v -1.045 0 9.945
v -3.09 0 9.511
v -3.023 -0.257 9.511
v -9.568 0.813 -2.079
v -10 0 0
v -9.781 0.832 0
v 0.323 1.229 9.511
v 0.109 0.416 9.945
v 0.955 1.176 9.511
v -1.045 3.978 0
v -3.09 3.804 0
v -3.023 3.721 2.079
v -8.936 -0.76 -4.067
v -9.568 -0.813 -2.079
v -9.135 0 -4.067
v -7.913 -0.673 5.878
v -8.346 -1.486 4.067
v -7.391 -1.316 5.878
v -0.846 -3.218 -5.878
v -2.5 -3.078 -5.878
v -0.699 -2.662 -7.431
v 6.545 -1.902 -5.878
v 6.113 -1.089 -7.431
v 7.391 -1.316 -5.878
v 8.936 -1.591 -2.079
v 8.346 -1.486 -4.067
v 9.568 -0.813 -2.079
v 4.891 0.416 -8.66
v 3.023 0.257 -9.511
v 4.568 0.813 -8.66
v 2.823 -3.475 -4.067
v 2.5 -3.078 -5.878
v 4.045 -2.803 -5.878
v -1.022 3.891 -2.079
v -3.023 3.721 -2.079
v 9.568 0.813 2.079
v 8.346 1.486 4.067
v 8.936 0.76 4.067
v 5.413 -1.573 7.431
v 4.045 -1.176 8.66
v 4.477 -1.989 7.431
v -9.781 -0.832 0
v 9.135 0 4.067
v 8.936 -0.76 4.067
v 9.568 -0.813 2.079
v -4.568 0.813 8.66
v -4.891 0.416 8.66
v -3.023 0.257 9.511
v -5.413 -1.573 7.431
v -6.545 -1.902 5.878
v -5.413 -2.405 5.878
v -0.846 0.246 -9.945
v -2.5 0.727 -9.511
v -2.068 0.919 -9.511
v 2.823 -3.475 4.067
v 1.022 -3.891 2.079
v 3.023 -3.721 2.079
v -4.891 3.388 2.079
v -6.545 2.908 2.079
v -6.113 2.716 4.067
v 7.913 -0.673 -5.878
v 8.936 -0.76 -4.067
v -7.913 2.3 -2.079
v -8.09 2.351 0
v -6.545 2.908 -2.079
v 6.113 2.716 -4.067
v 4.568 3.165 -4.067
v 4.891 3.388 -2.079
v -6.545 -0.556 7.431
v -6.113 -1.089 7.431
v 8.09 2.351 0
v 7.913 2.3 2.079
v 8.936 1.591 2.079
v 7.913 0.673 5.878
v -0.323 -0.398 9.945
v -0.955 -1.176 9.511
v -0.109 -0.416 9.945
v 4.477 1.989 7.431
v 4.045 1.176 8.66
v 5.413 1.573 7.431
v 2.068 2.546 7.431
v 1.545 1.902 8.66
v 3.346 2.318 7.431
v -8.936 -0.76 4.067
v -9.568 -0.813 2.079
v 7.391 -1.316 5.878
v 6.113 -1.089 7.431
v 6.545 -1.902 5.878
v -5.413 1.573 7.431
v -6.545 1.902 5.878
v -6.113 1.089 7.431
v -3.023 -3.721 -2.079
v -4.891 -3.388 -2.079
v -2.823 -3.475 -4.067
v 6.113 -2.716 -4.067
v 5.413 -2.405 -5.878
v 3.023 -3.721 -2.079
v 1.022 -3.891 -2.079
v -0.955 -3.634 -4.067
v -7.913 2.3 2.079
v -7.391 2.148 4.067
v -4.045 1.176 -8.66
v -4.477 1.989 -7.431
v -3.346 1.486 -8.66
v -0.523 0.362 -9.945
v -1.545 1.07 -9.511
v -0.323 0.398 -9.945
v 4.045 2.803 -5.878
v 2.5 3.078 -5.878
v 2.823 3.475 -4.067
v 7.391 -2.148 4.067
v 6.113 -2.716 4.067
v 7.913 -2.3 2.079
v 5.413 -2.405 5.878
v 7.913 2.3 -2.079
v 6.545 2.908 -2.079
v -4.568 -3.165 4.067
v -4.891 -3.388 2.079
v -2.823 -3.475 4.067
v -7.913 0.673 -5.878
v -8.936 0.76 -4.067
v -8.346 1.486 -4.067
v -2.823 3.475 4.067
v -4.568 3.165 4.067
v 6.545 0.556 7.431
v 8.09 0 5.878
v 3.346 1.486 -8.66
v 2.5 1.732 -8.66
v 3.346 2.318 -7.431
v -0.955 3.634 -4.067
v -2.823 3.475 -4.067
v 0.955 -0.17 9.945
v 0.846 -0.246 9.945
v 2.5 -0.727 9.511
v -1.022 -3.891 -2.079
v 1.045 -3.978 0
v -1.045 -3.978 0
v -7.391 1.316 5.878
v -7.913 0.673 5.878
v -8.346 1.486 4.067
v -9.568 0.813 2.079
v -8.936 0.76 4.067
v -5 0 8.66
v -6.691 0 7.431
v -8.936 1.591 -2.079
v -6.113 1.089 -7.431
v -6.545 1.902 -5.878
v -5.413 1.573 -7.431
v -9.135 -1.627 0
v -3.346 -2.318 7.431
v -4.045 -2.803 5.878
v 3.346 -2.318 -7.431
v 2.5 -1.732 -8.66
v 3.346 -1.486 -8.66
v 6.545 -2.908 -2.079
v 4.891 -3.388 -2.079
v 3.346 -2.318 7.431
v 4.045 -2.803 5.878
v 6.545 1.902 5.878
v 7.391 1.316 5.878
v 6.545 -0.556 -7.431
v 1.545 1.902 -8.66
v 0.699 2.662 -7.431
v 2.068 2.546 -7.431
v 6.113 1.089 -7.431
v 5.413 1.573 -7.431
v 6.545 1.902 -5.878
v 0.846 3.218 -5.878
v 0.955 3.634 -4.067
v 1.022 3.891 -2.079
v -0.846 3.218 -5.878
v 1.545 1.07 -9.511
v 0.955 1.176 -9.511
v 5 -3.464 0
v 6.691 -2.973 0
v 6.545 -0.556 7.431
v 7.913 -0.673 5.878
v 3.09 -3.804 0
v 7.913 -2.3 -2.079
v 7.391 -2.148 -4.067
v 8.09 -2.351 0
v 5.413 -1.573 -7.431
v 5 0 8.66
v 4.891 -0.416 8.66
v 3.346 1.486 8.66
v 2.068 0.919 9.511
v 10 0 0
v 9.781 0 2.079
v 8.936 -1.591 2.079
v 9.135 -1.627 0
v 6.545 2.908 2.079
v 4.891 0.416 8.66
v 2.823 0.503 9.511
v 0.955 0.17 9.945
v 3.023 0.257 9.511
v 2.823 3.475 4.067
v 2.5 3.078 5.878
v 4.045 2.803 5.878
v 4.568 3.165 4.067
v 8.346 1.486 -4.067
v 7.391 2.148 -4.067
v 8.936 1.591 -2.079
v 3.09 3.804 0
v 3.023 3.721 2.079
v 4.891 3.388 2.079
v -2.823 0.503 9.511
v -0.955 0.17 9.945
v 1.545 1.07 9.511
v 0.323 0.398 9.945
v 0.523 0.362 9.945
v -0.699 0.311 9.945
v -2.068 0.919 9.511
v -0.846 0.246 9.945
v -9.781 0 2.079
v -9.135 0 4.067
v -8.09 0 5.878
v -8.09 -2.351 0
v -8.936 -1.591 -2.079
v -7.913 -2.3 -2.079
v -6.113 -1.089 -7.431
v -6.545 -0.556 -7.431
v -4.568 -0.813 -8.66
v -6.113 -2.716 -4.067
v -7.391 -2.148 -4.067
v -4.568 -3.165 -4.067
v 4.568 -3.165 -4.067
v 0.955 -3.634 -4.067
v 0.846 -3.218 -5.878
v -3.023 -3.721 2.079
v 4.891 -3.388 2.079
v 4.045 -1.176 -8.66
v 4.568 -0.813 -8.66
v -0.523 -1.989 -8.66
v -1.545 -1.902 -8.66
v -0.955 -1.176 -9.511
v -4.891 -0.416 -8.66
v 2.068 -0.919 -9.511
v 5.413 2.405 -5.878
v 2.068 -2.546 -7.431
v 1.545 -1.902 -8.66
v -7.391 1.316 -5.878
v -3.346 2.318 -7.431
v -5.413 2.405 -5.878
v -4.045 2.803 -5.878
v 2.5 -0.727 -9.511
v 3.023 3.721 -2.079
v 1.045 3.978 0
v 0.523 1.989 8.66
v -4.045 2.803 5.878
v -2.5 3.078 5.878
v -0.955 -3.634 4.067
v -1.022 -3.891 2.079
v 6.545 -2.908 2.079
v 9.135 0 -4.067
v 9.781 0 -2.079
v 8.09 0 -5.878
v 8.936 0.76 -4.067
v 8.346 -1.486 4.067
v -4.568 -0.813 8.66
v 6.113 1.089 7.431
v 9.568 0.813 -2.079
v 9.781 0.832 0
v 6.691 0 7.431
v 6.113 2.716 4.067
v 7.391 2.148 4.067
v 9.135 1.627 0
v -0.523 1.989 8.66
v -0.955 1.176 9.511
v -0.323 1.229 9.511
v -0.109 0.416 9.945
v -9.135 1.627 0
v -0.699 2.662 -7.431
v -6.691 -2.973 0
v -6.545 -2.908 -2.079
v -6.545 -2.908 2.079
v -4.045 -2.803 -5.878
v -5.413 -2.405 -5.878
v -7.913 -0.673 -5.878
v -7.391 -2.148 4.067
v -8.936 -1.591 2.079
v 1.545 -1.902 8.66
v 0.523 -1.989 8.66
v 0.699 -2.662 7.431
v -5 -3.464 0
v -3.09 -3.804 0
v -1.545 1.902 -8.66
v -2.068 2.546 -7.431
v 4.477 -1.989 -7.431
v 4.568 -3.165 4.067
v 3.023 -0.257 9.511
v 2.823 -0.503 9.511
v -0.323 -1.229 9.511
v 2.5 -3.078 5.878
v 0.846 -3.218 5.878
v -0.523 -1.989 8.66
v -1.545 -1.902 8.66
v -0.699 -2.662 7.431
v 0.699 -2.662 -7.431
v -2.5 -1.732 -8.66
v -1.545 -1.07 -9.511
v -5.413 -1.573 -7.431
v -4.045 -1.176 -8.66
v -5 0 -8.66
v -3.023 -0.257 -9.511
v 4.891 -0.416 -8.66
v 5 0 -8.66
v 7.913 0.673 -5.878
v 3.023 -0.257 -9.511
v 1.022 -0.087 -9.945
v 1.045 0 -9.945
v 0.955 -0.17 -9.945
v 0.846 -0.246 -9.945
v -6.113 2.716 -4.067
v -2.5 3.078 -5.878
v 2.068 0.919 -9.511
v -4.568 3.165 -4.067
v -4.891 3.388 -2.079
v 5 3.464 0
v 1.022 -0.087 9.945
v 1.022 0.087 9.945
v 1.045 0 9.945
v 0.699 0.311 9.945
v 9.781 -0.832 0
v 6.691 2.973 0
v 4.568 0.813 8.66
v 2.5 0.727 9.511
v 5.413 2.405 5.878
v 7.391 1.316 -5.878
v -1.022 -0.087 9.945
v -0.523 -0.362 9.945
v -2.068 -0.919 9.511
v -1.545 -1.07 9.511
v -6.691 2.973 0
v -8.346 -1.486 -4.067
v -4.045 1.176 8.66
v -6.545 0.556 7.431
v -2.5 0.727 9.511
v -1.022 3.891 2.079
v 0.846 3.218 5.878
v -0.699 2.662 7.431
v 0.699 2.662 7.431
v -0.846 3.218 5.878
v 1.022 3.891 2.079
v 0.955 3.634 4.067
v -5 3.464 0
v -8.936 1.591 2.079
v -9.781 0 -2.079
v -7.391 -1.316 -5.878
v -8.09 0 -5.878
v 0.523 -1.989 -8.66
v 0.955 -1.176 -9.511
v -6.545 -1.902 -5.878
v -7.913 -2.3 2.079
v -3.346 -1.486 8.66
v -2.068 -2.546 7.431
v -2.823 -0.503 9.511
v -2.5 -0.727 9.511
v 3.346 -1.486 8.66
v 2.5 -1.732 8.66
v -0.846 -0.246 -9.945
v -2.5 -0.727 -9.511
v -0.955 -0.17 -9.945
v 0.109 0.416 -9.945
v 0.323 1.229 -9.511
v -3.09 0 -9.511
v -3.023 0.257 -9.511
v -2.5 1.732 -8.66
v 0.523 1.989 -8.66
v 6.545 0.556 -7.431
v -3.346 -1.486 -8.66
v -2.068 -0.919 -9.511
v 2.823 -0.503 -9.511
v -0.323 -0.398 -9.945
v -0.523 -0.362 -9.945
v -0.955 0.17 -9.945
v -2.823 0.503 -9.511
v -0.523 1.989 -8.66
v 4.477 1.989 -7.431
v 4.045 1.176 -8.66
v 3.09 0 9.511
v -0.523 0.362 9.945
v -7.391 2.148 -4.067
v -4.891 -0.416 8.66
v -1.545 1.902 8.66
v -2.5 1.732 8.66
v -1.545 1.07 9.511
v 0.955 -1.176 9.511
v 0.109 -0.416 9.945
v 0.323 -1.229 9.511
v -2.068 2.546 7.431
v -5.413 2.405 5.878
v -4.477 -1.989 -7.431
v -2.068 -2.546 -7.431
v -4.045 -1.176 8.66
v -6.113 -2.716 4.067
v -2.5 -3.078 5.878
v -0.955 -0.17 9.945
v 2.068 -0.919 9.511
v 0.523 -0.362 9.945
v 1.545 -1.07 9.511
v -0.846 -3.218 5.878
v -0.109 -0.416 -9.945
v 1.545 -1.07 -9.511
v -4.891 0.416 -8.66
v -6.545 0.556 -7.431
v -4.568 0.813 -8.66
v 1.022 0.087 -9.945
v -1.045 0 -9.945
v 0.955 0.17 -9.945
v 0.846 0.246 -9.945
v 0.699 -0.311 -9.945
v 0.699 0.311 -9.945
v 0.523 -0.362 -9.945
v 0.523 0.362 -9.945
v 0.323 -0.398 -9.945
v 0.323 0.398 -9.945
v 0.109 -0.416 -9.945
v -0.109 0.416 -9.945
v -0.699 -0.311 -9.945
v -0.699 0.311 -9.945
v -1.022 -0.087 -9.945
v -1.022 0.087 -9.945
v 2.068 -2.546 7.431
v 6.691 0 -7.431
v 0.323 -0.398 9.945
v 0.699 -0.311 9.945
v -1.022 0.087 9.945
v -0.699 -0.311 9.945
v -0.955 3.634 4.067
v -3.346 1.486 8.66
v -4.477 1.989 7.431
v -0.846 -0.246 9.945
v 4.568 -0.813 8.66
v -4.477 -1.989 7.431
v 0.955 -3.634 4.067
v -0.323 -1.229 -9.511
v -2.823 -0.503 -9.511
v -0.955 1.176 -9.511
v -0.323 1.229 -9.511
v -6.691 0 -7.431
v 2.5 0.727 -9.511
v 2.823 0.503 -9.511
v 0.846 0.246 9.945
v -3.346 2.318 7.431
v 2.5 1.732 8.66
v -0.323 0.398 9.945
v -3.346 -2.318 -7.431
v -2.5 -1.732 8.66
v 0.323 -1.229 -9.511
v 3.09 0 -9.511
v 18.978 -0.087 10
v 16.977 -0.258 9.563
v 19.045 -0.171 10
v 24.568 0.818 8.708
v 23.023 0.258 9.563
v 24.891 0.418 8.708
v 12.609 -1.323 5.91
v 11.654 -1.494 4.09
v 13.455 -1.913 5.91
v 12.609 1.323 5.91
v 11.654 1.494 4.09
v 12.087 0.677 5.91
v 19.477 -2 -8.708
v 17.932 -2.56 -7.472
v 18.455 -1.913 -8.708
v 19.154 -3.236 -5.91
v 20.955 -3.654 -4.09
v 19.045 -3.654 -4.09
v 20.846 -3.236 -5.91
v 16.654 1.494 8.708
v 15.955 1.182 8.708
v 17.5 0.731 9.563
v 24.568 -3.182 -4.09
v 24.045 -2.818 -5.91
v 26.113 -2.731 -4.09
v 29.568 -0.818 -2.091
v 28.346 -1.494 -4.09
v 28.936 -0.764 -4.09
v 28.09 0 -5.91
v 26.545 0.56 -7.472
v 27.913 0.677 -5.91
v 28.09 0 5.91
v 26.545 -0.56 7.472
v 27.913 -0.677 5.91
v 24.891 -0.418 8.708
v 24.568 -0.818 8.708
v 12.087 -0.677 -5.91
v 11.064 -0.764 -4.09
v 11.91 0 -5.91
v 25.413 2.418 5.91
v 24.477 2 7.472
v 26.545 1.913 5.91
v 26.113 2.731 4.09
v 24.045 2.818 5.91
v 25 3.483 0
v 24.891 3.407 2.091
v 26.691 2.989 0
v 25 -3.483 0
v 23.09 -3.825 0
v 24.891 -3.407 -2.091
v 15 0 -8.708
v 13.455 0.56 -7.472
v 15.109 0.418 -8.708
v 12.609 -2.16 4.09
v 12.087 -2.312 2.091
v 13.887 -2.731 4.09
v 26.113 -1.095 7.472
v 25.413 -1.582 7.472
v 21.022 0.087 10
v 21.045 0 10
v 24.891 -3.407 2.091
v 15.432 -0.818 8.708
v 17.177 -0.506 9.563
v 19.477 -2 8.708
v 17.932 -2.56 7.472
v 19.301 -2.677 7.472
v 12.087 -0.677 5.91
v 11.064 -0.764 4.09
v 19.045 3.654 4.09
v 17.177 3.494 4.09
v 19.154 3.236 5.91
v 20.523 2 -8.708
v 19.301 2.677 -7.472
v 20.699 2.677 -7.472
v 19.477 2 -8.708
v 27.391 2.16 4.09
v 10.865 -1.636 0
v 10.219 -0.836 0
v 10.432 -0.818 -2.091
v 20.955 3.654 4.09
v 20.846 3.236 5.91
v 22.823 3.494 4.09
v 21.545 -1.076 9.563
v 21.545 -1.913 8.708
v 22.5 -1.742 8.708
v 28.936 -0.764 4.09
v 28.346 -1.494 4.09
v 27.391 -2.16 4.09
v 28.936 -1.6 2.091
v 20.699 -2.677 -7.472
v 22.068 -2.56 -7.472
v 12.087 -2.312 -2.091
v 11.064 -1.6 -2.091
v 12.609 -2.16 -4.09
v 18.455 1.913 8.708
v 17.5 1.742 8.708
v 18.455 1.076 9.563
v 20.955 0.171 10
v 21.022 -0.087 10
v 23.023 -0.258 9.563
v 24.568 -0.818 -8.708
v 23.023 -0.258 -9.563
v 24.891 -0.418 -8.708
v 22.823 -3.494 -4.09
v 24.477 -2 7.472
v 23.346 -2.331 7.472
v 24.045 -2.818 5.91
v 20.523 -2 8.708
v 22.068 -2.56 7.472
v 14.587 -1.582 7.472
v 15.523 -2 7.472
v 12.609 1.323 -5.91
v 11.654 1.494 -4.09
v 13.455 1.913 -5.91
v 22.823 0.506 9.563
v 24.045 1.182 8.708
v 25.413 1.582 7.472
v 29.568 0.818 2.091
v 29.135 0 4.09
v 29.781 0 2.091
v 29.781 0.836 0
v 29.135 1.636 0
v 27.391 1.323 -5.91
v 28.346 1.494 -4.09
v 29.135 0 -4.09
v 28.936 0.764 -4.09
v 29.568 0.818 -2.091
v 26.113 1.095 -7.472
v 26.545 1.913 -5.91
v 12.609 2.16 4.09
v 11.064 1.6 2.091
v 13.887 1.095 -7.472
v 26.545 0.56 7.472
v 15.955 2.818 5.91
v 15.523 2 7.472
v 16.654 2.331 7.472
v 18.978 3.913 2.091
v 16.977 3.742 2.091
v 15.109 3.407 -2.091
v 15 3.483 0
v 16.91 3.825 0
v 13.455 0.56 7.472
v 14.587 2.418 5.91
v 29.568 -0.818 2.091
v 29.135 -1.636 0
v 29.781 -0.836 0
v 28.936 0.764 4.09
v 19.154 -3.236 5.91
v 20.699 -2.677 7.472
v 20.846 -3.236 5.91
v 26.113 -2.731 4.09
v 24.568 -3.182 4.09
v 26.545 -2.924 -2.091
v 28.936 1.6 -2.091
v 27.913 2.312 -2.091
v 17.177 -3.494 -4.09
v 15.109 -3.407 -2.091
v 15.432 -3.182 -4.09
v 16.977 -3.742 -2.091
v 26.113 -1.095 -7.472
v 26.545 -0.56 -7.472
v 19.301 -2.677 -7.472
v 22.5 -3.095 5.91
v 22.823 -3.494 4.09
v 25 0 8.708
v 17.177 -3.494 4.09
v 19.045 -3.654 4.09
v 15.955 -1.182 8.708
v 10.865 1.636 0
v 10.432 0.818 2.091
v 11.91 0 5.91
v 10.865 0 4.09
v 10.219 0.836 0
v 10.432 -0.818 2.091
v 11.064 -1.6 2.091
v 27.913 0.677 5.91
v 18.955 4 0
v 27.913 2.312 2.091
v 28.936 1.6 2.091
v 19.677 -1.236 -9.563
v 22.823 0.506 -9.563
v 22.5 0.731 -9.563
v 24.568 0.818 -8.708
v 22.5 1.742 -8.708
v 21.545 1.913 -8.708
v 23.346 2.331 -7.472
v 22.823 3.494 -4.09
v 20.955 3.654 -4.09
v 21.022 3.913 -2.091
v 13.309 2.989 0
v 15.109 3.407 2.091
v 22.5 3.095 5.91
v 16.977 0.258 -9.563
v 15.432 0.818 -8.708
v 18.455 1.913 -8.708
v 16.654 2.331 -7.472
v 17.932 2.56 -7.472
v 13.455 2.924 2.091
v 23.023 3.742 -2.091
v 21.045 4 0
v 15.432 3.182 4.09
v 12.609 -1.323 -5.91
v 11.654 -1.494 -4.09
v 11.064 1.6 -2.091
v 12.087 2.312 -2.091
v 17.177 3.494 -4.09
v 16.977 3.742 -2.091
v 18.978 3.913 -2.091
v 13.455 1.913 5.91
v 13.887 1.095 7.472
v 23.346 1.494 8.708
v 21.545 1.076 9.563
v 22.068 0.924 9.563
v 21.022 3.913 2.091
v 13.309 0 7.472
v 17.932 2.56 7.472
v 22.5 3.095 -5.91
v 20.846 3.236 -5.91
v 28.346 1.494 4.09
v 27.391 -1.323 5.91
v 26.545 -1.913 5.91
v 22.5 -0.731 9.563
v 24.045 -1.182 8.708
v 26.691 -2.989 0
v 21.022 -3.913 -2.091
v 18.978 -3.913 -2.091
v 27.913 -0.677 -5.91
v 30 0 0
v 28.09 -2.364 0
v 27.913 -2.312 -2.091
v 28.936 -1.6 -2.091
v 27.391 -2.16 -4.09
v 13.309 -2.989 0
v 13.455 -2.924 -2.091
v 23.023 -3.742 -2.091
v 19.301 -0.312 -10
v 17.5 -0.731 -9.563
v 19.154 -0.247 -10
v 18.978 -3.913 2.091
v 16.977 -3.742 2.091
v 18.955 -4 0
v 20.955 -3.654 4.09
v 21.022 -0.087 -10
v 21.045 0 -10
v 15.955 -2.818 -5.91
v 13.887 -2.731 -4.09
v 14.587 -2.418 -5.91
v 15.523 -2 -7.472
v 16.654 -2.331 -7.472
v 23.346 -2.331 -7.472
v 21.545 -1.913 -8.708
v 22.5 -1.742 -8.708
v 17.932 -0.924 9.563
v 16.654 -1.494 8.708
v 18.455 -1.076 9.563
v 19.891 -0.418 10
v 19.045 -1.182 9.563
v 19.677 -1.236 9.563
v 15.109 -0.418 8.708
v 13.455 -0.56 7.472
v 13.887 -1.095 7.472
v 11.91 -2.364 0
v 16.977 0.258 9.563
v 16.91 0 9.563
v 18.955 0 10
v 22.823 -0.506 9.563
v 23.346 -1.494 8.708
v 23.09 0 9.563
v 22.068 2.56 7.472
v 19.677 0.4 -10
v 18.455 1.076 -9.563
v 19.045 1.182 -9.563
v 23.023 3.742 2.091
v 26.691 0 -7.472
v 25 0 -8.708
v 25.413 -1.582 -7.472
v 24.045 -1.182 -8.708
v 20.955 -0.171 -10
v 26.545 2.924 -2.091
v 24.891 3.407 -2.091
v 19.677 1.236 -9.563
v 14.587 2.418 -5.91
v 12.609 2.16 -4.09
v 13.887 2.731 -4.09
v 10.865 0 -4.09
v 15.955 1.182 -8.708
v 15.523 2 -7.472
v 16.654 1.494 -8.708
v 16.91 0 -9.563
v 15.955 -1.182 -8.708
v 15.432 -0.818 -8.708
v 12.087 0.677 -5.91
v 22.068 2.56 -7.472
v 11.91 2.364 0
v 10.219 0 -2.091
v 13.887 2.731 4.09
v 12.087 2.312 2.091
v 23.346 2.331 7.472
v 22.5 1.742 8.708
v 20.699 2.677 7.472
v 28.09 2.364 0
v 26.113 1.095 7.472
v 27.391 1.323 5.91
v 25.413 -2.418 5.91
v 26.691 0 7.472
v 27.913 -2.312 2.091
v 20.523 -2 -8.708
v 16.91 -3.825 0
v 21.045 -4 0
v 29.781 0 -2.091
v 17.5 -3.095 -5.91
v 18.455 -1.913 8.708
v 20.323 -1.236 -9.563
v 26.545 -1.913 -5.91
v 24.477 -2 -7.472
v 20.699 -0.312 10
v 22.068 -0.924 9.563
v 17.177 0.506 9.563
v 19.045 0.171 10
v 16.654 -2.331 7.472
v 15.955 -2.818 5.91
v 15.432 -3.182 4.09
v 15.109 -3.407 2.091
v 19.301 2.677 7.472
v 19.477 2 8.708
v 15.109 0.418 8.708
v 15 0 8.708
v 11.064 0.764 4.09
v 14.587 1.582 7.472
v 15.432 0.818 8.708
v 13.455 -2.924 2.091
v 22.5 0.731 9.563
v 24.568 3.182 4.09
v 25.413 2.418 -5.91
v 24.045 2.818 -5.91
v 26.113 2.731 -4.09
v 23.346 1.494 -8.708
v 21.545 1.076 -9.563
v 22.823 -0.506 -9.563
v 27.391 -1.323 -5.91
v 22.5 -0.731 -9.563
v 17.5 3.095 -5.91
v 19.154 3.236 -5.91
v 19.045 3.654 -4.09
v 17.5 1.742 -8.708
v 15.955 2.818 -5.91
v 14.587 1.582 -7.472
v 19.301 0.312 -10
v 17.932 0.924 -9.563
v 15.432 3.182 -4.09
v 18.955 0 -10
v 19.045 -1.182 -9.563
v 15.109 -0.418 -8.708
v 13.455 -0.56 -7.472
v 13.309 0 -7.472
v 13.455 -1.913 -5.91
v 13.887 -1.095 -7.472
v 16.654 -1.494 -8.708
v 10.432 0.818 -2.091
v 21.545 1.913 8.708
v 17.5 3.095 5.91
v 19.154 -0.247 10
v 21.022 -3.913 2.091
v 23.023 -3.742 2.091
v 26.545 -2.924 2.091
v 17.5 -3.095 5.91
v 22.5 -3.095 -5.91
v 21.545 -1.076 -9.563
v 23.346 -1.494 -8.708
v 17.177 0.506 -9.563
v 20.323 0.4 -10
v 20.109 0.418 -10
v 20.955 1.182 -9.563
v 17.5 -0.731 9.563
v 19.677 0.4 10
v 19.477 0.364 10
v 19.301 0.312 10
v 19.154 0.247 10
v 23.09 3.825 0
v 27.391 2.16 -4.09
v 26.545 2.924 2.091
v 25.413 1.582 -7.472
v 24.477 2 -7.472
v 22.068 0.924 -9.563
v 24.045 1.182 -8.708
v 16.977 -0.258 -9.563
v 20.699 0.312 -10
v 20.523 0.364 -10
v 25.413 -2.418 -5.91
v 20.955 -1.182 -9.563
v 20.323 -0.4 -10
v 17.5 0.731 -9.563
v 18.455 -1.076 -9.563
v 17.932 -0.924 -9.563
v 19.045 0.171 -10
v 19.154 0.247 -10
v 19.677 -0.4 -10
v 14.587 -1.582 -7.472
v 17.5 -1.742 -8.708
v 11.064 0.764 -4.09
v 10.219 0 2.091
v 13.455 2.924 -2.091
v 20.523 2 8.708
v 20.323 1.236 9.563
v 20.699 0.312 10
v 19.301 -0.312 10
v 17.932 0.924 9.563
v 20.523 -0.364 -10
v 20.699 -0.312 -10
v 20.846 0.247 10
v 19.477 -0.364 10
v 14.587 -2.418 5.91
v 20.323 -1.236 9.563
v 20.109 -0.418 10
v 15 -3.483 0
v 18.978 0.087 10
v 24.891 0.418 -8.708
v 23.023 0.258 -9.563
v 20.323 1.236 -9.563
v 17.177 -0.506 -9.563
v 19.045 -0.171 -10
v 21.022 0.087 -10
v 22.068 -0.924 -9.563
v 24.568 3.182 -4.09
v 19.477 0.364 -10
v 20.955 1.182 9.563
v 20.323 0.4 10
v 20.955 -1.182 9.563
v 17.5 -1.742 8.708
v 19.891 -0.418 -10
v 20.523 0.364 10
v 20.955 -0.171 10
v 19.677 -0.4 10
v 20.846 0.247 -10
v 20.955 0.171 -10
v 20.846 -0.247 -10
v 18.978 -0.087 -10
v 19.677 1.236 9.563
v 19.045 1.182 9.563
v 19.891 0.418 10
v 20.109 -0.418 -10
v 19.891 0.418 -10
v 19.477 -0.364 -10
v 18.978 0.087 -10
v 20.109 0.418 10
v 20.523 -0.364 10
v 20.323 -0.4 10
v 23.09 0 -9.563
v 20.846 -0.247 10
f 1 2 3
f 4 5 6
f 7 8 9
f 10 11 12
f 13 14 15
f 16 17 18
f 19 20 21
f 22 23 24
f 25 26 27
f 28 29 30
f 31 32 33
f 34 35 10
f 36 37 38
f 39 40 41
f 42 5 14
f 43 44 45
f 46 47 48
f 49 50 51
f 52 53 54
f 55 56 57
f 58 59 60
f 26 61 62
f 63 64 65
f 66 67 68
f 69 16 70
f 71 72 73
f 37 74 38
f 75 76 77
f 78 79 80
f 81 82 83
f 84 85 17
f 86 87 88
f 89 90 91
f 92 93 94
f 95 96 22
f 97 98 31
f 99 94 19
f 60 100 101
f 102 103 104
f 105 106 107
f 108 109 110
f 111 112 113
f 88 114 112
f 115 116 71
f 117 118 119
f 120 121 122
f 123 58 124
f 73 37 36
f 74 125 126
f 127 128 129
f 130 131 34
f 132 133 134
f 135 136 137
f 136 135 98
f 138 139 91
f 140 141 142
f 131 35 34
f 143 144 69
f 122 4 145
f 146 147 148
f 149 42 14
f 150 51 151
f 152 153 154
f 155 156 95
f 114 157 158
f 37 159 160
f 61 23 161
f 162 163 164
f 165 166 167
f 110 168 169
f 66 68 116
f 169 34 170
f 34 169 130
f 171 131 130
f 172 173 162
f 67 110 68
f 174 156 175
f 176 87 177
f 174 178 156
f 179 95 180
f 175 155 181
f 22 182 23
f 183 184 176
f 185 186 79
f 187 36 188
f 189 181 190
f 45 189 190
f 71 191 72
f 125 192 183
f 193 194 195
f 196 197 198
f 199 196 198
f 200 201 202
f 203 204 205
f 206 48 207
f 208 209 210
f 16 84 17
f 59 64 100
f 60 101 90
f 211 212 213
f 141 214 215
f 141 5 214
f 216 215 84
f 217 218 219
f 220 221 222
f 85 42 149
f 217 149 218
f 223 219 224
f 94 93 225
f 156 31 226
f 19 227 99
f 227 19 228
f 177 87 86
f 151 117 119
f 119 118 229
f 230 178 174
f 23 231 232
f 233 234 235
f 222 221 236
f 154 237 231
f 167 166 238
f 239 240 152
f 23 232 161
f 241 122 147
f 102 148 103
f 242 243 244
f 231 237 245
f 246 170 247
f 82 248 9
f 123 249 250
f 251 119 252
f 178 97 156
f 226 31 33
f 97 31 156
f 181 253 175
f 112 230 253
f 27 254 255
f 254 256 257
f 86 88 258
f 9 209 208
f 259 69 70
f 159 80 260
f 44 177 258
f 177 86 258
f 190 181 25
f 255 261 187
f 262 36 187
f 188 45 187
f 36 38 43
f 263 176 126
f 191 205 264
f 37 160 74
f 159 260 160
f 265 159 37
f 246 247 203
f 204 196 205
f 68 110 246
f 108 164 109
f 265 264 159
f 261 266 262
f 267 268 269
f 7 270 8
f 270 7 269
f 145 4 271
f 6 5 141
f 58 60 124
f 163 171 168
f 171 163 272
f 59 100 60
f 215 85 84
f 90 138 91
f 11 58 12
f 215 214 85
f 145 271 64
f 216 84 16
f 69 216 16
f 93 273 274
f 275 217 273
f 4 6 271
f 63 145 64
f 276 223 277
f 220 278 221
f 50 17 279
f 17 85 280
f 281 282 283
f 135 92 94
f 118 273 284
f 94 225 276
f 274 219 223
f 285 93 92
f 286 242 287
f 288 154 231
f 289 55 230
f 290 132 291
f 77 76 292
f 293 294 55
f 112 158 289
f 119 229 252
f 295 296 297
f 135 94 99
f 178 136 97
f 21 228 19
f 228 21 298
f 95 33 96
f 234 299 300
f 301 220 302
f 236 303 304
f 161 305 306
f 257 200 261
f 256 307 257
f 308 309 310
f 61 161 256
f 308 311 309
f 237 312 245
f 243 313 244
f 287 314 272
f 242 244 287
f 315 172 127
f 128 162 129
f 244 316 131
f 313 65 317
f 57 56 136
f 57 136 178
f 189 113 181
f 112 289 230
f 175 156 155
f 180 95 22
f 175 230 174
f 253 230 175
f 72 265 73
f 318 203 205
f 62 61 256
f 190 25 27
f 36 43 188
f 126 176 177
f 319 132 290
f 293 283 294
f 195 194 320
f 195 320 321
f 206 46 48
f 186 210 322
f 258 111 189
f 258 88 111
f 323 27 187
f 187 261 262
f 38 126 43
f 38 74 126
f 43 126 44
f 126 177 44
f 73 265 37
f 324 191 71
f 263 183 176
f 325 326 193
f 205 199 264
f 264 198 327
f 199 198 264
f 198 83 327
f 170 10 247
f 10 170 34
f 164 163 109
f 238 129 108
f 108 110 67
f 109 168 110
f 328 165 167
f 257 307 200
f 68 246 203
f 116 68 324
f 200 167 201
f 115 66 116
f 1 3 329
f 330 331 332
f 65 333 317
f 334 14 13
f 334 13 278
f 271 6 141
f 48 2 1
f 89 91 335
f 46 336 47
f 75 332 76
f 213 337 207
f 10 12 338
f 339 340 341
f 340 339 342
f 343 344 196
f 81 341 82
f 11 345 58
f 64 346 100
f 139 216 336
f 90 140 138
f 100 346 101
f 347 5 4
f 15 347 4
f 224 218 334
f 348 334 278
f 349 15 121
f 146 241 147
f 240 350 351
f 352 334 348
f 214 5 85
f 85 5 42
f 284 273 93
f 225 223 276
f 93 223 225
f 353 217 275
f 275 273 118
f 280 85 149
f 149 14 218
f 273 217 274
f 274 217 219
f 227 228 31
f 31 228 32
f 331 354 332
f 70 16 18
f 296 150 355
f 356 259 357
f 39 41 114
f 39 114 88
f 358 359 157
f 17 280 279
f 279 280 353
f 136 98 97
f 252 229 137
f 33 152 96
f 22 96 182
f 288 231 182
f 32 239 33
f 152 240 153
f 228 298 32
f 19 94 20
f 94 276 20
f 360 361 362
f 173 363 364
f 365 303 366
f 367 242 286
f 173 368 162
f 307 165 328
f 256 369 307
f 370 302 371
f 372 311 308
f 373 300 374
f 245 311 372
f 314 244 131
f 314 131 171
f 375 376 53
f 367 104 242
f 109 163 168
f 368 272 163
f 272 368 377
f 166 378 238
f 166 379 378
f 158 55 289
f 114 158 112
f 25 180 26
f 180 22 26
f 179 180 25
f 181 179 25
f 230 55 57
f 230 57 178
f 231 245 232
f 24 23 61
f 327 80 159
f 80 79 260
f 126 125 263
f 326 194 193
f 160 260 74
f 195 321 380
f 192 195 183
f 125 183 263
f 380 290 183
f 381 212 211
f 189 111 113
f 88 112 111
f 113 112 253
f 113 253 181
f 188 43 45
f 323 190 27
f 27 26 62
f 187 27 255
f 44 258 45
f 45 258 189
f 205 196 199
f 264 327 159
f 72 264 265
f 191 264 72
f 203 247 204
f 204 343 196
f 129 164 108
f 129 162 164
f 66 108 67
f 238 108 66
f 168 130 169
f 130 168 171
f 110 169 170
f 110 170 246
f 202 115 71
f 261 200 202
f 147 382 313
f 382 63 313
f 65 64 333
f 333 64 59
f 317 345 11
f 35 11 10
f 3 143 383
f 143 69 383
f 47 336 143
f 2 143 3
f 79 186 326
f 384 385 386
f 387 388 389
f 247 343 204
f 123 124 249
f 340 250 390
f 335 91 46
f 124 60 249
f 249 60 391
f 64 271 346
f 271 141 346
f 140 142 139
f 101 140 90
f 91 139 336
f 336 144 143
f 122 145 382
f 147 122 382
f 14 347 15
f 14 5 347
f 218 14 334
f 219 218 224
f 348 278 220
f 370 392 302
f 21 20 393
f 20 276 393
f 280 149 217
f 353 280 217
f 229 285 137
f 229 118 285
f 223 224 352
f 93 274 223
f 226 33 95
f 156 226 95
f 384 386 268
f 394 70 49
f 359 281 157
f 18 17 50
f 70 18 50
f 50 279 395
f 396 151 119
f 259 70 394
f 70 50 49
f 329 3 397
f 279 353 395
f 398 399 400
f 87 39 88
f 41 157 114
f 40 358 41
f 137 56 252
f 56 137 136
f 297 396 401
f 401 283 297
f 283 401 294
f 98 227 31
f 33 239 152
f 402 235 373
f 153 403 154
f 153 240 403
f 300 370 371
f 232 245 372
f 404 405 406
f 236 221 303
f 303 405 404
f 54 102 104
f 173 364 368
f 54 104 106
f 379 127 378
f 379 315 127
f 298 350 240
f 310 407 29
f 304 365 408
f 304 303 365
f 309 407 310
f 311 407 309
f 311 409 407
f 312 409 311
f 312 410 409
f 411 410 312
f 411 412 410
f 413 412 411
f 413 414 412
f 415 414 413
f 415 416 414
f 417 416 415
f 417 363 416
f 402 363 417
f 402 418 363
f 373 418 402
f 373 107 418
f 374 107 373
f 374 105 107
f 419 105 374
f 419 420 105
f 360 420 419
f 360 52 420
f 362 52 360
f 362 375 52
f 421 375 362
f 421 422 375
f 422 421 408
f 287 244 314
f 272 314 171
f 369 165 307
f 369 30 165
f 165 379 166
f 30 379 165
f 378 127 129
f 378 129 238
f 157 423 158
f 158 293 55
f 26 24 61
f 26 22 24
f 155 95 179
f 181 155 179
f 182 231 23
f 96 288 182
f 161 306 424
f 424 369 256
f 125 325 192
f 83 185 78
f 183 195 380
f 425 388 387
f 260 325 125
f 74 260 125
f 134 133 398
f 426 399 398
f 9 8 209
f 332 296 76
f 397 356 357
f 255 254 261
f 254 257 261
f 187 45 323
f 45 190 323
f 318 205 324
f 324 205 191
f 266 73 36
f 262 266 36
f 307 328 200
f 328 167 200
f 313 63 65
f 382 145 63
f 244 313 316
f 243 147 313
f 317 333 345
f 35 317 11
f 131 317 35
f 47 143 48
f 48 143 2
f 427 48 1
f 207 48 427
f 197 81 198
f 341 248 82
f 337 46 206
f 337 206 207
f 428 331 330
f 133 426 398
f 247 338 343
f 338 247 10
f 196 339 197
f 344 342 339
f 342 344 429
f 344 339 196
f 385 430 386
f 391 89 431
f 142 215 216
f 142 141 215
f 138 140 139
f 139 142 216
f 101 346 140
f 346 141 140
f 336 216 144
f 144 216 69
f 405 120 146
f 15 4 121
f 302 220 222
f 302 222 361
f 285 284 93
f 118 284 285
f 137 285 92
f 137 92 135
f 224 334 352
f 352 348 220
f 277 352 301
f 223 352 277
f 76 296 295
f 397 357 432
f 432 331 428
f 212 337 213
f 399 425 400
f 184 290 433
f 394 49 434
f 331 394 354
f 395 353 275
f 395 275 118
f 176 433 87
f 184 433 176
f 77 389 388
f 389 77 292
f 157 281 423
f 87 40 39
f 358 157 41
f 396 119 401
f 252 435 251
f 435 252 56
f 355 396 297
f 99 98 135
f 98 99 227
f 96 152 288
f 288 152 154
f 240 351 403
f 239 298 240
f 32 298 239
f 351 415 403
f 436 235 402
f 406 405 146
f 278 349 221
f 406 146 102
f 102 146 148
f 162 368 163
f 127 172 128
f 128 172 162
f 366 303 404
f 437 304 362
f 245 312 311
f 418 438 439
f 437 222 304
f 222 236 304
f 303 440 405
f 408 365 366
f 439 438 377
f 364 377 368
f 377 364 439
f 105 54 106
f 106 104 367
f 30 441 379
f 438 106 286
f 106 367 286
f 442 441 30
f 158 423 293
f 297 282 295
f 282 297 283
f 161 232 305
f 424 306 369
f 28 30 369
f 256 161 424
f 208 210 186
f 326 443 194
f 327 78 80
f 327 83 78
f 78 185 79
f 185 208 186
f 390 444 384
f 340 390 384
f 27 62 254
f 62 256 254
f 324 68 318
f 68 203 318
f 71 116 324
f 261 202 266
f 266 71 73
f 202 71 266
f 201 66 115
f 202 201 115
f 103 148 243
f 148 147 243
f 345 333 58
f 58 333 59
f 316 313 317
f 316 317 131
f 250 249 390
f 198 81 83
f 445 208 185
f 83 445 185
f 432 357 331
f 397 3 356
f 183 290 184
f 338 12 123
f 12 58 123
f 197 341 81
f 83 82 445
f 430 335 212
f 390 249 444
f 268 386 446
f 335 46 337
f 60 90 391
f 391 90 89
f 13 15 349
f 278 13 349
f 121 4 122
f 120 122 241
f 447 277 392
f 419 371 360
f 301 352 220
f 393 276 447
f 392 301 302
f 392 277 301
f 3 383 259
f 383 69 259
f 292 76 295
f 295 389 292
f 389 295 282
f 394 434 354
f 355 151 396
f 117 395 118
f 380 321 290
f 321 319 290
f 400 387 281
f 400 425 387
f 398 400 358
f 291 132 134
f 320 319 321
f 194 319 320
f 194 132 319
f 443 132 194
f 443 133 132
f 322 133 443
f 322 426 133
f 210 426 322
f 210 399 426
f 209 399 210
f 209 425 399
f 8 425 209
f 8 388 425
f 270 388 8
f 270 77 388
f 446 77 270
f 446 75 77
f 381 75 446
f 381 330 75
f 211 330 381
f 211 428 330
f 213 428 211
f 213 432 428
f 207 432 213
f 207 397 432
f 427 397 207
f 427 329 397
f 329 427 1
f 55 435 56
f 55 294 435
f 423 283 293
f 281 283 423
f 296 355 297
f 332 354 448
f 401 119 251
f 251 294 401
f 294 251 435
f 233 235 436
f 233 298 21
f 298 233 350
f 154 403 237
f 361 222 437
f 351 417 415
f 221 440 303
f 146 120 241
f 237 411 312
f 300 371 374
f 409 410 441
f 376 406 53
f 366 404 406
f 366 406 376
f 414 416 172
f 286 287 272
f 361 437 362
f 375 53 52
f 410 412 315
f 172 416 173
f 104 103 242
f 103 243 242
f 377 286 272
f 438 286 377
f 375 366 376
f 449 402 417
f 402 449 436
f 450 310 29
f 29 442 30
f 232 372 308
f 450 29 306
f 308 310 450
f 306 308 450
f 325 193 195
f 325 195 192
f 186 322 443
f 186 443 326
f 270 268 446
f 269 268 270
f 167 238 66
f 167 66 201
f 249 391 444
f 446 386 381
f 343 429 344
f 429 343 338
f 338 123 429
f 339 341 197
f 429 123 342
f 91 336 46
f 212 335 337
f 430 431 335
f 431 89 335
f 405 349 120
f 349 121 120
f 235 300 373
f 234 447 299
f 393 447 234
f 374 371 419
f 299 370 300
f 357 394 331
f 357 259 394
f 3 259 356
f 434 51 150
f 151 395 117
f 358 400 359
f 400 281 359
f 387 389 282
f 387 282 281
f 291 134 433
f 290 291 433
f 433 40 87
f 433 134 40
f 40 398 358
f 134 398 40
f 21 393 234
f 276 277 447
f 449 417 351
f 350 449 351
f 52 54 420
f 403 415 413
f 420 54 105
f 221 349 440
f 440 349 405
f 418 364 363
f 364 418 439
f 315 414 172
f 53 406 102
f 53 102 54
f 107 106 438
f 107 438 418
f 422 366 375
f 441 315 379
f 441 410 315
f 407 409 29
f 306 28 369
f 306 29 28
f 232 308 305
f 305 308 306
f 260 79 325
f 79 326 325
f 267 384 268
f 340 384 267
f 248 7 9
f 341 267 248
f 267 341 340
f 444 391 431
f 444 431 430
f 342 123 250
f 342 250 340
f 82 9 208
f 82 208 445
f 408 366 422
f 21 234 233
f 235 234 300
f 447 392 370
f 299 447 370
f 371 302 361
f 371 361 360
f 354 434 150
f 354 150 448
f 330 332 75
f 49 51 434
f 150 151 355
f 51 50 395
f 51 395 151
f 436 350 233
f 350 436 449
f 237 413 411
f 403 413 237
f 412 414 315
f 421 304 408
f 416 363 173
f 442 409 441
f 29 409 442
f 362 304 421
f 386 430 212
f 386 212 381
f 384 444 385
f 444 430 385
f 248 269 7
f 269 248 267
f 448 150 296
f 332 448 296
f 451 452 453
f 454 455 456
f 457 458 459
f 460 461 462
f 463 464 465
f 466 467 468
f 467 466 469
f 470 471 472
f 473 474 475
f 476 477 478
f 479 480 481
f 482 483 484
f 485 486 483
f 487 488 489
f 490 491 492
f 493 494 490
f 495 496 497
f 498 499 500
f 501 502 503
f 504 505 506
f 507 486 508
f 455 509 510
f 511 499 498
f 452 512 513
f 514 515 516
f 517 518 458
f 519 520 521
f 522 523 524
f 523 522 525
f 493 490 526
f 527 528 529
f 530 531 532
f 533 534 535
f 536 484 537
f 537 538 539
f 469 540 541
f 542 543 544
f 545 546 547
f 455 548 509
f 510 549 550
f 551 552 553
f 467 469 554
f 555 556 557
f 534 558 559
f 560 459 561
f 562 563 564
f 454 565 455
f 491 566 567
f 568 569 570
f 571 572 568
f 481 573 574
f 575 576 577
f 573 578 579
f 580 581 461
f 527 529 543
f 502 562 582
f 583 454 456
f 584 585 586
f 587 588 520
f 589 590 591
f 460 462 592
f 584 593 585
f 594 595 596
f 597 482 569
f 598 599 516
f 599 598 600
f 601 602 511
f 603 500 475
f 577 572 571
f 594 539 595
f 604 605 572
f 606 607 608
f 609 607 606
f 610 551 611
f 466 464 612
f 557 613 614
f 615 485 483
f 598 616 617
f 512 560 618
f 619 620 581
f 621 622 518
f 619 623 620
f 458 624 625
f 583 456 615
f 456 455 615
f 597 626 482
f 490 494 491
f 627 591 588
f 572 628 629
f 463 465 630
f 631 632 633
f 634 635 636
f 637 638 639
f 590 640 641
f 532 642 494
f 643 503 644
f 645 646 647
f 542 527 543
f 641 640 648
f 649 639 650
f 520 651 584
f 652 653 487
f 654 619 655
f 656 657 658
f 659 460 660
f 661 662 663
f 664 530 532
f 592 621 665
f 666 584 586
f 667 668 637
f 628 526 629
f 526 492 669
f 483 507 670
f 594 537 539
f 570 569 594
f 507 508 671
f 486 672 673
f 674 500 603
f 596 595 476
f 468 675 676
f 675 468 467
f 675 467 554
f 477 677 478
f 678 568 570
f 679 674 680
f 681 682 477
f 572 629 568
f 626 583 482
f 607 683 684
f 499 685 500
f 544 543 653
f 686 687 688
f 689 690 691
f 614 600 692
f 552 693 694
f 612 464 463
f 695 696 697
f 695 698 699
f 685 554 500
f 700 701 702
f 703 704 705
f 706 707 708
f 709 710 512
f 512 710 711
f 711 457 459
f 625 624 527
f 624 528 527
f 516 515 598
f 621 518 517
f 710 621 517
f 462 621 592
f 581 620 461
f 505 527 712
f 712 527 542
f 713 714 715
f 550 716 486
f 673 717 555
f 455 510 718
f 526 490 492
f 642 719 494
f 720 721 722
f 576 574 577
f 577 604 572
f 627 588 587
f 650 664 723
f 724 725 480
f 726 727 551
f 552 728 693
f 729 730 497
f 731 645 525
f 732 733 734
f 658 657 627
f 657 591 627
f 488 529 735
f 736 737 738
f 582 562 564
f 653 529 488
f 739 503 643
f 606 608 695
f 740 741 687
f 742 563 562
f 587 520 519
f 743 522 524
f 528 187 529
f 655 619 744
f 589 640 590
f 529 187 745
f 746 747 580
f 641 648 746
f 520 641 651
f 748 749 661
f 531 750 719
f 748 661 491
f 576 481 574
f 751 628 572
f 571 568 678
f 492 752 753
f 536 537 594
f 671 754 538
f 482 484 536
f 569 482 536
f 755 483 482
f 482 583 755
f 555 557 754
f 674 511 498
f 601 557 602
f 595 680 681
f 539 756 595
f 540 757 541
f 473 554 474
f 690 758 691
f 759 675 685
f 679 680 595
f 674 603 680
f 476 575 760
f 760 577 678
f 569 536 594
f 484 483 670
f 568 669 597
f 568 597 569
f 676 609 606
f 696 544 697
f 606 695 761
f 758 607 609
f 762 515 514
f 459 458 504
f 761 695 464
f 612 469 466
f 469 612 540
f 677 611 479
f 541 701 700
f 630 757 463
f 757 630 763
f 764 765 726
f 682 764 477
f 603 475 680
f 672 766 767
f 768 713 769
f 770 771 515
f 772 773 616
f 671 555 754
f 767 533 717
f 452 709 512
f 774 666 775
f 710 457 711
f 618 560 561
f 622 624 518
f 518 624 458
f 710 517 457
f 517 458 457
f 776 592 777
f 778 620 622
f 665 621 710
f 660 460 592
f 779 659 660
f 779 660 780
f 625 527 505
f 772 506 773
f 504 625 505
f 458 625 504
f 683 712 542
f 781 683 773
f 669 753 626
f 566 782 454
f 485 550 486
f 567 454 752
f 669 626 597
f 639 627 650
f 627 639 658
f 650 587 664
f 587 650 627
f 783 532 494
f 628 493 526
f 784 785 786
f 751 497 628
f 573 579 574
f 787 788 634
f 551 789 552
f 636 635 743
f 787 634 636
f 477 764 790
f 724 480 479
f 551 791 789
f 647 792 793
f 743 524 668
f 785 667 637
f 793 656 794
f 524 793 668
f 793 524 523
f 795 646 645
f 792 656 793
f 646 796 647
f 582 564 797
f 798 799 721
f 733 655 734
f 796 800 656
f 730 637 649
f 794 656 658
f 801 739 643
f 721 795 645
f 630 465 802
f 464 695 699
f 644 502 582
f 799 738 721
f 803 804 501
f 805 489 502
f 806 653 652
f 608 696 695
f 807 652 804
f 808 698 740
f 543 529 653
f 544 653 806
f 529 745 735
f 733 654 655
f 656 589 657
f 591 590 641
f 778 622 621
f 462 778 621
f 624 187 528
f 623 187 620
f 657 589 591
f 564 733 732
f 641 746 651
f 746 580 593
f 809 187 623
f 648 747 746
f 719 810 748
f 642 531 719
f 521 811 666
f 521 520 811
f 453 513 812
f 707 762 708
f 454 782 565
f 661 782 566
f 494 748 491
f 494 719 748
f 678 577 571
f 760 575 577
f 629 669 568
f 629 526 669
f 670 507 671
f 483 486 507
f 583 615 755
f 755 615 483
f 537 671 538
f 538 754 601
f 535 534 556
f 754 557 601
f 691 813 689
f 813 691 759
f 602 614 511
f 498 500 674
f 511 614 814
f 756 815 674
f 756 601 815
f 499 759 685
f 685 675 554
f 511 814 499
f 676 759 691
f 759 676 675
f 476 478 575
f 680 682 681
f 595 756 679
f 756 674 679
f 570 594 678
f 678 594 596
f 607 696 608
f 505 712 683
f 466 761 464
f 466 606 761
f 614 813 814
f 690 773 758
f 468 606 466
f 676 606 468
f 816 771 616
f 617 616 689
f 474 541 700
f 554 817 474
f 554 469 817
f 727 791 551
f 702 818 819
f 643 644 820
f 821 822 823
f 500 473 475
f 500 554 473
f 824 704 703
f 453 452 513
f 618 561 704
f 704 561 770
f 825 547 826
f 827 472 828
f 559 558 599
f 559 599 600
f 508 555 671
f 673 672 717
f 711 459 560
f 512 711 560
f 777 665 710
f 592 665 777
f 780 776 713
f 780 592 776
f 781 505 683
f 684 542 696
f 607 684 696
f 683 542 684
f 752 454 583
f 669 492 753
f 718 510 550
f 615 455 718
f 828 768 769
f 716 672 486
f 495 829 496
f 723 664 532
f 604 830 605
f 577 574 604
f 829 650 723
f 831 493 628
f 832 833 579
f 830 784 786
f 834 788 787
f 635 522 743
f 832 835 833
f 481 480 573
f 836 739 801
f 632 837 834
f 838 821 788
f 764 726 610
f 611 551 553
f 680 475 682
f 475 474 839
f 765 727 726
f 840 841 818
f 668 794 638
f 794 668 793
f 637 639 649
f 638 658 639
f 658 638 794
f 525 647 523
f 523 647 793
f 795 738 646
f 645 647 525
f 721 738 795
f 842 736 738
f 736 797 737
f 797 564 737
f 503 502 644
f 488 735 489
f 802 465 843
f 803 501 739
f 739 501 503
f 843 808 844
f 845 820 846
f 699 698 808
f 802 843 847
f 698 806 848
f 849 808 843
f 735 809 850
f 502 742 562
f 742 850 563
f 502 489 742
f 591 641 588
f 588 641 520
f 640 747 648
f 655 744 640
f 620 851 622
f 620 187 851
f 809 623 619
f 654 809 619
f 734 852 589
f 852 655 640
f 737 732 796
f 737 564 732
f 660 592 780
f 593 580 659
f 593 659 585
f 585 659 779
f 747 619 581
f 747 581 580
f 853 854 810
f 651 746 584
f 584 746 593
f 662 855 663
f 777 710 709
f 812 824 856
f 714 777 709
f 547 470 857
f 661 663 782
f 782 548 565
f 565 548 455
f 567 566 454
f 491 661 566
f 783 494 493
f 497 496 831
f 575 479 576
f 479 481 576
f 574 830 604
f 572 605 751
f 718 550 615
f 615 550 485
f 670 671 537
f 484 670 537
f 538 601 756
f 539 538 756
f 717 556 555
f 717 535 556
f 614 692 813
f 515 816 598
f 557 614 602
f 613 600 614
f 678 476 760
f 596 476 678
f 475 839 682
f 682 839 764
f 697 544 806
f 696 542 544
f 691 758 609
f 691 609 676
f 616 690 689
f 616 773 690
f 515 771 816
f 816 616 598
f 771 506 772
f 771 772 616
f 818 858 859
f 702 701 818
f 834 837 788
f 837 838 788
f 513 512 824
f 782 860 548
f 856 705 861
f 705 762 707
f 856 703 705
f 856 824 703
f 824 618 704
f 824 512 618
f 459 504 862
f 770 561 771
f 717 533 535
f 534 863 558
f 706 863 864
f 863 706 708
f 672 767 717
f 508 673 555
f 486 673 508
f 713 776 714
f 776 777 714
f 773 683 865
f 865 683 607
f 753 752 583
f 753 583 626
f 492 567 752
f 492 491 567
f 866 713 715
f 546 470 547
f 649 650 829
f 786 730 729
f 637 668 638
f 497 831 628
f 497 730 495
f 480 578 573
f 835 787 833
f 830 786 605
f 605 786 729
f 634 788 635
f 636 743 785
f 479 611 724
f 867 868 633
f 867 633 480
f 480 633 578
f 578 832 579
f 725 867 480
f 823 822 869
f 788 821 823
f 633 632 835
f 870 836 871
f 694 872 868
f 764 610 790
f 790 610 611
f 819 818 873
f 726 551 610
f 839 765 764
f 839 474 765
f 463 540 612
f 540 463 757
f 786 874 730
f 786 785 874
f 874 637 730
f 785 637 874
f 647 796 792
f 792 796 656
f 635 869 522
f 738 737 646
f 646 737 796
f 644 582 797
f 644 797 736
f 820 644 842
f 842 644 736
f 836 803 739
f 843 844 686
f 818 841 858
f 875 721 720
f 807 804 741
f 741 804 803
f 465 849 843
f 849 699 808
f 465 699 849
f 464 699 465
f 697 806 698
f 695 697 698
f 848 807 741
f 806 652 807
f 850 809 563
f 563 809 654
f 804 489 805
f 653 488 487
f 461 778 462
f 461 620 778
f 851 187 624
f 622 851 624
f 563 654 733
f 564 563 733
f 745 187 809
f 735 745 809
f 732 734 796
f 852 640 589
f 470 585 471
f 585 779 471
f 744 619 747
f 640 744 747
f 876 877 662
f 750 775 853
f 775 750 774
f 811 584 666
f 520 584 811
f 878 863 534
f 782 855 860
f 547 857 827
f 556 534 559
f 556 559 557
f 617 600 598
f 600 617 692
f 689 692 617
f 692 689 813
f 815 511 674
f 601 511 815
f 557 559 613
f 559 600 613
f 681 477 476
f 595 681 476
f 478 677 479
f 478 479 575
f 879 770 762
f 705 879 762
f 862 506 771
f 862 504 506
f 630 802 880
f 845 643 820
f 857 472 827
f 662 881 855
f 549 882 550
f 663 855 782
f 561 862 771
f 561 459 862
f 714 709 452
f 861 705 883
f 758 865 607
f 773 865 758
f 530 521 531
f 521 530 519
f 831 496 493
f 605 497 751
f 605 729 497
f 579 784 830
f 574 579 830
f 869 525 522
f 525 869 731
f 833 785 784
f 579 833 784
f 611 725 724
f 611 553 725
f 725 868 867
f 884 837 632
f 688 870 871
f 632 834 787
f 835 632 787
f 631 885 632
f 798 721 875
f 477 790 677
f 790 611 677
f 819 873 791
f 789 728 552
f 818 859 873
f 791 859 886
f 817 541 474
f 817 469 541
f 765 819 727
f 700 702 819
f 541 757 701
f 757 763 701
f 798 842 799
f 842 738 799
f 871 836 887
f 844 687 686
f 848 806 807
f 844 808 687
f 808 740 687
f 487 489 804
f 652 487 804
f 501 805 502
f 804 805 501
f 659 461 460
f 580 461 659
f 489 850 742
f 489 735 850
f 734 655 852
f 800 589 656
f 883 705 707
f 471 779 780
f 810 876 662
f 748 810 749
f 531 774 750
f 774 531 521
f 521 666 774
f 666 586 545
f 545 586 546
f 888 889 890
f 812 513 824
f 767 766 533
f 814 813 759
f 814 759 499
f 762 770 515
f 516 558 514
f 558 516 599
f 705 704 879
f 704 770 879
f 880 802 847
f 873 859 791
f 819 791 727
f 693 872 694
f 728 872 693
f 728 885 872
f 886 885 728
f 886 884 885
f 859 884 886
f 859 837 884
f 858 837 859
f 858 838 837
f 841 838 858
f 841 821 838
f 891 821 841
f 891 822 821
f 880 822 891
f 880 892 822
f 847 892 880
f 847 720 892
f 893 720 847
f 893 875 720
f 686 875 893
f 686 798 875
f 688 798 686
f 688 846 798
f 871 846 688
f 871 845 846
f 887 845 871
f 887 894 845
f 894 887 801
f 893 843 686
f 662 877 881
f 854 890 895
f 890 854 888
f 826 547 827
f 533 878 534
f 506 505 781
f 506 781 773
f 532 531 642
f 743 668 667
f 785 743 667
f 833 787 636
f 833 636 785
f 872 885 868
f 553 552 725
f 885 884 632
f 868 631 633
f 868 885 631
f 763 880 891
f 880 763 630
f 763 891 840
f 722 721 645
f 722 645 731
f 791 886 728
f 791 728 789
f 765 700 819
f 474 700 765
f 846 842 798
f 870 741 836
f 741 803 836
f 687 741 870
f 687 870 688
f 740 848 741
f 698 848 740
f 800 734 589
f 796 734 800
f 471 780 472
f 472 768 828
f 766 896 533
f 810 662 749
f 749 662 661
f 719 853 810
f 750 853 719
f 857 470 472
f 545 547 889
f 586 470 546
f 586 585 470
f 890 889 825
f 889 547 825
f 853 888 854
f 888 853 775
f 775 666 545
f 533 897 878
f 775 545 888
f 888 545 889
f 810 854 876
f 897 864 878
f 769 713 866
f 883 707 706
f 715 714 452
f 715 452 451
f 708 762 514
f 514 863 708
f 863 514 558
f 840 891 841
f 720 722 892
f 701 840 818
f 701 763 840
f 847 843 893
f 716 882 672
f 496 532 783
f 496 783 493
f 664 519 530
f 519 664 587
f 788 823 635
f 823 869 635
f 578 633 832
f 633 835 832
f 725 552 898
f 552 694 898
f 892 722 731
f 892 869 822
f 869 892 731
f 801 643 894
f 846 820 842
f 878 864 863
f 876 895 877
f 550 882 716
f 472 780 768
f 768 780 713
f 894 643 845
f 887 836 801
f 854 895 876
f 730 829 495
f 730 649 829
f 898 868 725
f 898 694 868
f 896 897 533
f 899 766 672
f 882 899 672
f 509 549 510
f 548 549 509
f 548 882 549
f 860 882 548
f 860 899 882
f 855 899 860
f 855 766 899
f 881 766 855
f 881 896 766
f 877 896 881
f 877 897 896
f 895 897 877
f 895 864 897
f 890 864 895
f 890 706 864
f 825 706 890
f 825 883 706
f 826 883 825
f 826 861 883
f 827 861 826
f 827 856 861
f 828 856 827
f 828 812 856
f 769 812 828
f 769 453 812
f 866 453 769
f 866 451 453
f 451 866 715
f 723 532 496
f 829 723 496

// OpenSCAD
scale([1,0.4,1])
    sphere(r=10);

resize([20,8,20])
translate([20,0,0])    
    sphere(r=10);
